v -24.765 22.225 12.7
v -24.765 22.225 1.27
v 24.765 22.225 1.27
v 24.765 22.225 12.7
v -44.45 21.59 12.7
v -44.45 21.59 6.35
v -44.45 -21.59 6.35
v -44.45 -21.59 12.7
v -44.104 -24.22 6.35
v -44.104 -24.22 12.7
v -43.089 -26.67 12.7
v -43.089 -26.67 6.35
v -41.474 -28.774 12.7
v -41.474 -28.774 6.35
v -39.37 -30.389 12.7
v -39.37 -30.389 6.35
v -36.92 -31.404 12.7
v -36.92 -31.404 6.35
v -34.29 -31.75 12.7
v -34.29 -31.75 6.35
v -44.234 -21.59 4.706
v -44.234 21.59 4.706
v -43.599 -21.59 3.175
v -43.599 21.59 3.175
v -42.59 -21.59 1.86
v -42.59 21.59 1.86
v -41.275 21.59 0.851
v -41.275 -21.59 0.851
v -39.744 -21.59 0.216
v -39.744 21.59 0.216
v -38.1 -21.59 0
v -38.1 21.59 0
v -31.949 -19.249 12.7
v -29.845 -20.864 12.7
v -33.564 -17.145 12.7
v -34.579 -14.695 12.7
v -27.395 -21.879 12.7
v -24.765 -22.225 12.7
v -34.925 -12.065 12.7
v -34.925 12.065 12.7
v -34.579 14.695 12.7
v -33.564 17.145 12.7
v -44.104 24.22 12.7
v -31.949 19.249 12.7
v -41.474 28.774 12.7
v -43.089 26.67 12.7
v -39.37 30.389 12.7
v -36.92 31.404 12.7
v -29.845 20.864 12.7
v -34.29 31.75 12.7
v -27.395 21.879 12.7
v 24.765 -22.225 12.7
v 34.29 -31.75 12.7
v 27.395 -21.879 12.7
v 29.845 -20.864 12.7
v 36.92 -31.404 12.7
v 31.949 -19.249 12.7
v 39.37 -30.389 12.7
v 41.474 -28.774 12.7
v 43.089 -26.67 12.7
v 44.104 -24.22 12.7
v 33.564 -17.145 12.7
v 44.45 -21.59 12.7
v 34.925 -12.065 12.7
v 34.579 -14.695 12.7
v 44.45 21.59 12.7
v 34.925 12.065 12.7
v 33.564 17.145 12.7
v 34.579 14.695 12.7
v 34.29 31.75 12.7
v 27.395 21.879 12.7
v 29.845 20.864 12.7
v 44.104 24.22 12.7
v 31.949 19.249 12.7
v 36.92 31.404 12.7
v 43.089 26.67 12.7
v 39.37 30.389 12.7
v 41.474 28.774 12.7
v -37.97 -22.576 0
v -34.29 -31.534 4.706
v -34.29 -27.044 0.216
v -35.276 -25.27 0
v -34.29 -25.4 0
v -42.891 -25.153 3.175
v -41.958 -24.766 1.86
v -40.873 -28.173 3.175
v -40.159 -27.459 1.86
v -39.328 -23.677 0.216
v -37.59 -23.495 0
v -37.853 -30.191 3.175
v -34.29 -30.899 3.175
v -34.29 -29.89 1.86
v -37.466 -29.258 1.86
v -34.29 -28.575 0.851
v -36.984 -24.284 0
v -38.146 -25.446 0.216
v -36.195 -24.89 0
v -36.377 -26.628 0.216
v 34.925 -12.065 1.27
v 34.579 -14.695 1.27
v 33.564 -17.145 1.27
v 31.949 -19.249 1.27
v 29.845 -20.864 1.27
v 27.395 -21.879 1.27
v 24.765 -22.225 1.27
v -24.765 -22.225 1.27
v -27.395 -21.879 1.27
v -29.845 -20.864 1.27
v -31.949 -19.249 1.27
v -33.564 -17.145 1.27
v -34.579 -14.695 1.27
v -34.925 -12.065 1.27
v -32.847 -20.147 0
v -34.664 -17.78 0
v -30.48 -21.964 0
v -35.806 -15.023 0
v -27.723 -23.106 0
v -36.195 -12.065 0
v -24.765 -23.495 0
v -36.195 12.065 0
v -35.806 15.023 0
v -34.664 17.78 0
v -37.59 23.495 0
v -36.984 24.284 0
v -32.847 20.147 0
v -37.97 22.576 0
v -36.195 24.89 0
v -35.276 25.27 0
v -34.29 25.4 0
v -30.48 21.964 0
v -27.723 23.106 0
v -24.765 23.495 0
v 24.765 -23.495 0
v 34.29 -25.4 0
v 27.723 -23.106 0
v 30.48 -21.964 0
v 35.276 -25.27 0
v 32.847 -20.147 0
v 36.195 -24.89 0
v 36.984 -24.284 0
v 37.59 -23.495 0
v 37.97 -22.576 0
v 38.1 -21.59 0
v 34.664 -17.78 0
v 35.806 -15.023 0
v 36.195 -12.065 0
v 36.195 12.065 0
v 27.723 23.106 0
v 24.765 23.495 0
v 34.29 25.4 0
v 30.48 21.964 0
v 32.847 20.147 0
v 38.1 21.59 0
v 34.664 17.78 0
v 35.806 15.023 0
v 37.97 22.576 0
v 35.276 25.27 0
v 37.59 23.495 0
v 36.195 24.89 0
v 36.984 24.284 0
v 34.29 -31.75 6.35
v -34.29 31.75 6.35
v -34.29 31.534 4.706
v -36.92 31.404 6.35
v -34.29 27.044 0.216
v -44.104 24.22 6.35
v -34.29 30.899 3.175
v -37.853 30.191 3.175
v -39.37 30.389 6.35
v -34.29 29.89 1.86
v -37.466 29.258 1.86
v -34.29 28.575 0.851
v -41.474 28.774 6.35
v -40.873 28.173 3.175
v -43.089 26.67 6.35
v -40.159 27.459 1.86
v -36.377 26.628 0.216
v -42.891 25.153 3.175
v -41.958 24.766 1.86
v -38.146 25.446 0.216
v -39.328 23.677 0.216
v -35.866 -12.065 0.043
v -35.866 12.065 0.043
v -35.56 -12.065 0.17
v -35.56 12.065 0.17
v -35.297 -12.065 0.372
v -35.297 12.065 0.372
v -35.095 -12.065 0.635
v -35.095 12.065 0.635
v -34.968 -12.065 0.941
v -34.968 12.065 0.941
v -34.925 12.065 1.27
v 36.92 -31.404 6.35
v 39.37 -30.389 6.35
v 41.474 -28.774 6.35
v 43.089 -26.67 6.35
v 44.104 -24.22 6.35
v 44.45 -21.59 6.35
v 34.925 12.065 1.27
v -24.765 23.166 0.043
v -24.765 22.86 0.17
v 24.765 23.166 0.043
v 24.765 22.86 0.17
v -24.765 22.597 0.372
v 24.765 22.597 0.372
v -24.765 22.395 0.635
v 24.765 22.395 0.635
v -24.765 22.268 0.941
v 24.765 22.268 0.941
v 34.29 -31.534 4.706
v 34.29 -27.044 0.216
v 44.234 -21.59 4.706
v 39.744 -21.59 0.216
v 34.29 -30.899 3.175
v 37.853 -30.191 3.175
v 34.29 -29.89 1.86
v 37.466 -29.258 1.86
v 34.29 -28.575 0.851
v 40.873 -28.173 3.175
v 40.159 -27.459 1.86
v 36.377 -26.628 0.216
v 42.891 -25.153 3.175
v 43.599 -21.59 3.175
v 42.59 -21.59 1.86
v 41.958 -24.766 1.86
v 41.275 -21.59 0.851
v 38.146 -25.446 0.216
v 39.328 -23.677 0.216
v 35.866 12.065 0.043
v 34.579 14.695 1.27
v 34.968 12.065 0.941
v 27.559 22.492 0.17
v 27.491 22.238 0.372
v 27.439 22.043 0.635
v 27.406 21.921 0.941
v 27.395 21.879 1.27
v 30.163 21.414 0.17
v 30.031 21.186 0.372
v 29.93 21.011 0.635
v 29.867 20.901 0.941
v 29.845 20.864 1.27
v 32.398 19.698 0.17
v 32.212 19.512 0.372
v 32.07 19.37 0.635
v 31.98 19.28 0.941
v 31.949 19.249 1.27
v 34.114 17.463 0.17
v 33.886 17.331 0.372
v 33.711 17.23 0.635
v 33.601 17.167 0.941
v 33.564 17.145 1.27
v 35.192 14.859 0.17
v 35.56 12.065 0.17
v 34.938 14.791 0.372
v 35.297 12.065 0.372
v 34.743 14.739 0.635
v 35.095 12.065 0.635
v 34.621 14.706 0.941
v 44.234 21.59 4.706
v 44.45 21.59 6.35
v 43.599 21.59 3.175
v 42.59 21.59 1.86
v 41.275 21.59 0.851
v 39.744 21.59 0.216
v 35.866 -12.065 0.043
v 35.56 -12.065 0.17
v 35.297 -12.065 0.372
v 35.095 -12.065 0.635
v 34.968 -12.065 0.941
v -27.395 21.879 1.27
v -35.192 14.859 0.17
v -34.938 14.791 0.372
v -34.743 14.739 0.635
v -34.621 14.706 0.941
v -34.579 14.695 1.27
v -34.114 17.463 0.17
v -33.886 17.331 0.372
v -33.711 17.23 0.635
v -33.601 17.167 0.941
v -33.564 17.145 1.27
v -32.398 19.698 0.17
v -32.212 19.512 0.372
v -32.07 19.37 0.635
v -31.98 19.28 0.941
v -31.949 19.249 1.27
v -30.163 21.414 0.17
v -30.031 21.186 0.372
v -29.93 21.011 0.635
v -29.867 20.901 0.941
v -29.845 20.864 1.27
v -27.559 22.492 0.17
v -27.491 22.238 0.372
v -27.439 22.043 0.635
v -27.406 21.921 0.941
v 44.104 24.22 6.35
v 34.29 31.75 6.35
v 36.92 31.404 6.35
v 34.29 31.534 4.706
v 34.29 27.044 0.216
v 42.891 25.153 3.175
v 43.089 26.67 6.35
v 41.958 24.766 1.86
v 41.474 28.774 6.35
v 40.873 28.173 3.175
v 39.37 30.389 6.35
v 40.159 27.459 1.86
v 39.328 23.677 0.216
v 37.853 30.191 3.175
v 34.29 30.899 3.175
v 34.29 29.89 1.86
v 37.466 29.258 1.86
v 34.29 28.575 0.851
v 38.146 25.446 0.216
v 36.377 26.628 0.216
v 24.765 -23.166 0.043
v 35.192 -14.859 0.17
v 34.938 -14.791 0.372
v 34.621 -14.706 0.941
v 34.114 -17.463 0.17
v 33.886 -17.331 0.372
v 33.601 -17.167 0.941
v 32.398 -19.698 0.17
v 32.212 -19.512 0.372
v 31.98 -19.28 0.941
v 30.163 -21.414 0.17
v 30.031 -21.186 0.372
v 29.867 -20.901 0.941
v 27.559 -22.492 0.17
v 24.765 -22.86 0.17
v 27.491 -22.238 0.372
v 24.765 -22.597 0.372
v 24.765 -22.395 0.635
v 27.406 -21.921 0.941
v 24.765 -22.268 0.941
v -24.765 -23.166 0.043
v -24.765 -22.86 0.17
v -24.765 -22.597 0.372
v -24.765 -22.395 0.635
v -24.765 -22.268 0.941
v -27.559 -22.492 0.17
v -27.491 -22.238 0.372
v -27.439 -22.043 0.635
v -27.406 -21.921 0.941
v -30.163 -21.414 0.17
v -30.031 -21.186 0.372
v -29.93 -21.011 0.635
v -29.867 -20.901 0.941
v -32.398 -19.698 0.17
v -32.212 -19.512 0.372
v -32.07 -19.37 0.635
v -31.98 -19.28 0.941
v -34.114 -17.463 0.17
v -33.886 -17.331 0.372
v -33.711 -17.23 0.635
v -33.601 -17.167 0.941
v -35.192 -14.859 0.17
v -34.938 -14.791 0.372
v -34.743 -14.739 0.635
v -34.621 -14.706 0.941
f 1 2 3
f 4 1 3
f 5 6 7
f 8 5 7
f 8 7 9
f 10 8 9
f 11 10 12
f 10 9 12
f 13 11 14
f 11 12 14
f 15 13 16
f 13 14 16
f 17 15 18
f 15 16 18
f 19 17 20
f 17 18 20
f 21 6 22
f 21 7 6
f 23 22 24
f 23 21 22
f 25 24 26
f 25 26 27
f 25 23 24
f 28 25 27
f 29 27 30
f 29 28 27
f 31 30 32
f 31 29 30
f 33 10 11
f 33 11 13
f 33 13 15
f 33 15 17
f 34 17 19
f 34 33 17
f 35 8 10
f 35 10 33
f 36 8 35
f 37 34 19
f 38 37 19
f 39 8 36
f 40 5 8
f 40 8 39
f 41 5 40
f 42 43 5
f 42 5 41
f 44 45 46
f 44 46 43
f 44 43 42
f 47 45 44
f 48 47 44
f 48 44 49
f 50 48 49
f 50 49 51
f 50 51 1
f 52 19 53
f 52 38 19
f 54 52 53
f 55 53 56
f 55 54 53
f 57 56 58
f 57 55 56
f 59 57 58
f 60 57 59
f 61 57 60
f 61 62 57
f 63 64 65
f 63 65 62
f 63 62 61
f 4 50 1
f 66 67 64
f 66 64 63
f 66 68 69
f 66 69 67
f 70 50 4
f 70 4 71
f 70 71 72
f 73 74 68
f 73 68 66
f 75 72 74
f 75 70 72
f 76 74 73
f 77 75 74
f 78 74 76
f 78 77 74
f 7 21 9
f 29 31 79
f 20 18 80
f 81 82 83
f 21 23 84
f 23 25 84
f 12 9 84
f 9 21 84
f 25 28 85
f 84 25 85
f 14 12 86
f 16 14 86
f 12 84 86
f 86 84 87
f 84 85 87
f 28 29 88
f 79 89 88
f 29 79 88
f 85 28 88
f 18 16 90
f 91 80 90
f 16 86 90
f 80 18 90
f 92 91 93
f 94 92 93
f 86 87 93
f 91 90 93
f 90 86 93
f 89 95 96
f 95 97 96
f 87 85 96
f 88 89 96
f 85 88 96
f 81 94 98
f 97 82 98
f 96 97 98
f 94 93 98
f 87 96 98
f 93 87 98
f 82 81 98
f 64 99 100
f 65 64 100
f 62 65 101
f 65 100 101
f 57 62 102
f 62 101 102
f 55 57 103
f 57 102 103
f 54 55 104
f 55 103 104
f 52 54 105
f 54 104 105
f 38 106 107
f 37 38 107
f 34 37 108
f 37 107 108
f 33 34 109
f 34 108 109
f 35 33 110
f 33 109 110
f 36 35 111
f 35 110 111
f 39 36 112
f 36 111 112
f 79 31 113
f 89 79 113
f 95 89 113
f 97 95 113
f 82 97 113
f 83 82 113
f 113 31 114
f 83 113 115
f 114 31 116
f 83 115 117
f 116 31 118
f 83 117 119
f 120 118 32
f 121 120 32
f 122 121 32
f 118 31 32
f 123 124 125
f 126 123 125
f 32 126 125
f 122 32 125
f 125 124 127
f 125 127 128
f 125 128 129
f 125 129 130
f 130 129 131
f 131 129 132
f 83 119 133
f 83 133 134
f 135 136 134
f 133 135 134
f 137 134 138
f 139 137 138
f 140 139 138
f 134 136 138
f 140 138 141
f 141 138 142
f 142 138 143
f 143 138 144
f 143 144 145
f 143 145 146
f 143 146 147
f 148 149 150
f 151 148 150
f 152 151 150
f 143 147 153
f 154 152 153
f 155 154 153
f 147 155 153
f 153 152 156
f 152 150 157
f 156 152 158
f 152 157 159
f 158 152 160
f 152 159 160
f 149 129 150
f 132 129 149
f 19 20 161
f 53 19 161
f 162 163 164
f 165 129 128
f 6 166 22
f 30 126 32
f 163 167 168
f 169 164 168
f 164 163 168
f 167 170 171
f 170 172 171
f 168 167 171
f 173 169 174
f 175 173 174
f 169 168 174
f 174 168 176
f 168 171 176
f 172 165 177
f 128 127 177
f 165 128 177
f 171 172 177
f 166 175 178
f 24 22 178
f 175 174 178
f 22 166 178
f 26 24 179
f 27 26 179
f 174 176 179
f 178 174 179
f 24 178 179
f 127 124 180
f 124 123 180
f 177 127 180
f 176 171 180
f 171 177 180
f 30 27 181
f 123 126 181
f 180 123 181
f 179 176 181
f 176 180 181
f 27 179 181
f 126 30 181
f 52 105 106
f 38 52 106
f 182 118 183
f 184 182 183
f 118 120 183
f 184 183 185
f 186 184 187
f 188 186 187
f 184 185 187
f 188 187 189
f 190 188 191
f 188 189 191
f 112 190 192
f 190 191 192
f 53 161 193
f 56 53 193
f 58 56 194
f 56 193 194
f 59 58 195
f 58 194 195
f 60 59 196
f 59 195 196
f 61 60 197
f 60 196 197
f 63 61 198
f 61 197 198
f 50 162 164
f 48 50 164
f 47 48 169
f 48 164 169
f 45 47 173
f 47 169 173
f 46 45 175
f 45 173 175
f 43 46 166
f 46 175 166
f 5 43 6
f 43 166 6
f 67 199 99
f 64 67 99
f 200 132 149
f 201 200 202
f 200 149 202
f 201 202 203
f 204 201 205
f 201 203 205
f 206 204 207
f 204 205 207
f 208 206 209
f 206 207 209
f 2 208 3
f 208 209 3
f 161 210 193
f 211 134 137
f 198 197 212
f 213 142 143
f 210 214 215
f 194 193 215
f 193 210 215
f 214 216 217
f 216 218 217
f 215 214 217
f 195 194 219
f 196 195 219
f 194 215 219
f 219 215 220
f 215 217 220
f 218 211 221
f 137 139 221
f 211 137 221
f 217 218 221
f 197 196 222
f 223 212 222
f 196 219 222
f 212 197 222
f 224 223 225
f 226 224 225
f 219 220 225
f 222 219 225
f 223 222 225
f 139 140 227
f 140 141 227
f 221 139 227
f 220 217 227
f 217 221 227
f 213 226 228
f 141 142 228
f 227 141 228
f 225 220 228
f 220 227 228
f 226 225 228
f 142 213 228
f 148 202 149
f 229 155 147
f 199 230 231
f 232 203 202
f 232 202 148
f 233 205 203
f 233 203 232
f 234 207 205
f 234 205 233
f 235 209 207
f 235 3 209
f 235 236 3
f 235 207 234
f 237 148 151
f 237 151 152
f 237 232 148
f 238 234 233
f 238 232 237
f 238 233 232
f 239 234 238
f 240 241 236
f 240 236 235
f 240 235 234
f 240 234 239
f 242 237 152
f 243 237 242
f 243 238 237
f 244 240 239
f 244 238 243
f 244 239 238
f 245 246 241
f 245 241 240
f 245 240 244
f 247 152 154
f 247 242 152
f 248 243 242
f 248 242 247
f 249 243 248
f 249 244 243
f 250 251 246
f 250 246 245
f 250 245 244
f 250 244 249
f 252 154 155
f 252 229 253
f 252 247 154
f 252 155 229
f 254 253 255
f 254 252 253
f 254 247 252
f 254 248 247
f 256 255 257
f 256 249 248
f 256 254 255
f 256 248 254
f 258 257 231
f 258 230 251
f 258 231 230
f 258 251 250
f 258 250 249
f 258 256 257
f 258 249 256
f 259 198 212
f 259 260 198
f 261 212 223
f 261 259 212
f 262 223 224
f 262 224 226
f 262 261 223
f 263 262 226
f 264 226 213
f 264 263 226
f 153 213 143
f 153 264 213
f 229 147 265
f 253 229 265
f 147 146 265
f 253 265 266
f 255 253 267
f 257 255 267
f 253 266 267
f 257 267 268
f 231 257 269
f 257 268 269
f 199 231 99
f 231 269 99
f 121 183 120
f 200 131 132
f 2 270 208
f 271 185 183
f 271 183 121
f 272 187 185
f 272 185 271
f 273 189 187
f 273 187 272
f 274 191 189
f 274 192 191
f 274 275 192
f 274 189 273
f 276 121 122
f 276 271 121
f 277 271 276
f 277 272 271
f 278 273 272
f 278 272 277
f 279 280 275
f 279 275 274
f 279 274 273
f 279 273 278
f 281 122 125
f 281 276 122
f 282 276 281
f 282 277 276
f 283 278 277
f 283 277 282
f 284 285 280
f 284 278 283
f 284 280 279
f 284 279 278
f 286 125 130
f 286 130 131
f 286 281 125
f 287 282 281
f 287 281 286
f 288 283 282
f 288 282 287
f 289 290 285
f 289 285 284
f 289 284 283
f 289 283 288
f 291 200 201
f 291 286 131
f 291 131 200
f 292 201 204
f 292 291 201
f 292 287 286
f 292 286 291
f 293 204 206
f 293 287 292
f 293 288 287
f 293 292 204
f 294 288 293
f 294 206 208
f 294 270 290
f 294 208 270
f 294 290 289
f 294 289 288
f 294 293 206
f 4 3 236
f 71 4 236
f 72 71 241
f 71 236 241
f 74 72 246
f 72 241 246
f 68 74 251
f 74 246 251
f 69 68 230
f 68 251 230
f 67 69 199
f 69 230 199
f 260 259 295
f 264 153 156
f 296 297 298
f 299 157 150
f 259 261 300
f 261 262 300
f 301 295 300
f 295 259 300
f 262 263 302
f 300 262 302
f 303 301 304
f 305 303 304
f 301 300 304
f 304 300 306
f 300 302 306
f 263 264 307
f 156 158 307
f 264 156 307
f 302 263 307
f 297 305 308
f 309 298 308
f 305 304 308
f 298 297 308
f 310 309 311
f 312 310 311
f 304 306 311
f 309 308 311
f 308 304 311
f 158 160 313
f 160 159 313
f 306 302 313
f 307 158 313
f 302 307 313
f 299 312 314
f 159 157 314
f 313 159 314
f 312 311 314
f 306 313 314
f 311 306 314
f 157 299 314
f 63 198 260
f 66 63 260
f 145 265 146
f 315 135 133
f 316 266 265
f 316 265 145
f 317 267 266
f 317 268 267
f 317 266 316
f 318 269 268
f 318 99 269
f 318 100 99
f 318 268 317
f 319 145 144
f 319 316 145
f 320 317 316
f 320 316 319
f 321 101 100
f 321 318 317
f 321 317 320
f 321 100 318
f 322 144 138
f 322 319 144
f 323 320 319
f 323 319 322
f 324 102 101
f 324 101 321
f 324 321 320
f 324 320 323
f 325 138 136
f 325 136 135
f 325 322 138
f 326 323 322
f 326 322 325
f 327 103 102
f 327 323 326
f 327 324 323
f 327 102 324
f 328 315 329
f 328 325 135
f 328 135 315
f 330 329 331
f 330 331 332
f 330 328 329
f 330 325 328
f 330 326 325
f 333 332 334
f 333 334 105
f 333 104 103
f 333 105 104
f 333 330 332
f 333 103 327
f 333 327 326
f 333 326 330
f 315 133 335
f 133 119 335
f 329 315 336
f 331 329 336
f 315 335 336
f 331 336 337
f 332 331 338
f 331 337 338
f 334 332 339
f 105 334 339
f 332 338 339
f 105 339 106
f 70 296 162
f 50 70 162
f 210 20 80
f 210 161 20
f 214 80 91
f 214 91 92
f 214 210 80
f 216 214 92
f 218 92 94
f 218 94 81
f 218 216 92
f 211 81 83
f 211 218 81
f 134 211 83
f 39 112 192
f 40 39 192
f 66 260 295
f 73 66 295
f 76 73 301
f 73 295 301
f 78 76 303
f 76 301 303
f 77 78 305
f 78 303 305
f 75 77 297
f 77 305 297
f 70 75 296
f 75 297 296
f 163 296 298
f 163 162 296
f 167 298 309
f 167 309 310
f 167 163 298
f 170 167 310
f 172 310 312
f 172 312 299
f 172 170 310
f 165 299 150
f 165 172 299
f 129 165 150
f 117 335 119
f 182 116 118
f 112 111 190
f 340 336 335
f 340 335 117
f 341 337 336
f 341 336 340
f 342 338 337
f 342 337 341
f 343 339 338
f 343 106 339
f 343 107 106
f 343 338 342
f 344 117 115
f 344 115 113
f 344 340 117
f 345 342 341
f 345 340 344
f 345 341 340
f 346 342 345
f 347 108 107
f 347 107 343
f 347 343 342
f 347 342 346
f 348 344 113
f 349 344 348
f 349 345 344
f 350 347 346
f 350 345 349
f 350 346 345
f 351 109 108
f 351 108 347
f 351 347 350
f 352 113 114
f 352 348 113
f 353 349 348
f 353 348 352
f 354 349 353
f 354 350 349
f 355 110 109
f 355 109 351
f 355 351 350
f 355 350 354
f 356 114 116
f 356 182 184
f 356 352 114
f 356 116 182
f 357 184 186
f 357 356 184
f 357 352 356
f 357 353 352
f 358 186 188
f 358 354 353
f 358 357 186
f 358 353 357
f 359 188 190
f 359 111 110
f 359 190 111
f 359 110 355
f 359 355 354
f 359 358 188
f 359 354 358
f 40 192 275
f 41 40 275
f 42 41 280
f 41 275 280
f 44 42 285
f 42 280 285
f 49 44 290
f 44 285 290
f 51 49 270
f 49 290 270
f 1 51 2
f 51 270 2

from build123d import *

# Parameters (mm, degrees)
F1_DEPTH = 12.7
F2_R     = 6.35
F3_R     = 1.27


with BuildPart() as f1:
    # F0 (on Top) → F1 (new body)
    with BuildSketch(Plane.XY):
        with BuildLine():
            Line((34.29, 31.75), (-34.29, 31.75))
            ThreePointArc((-34.29, 31.75), (-41.474205, 28.774205), (-44.45, 21.59))
            Line((-44.45, 21.59), (-44.45, -21.59))
            ThreePointArc((-44.45, -21.59), (-41.474205, -28.774205), (-34.29, -31.75))
            Line((-34.29, -31.75), (34.29, -31.75))
            ThreePointArc((34.29, -31.75), (41.474205, -28.774205), (44.45, -21.59))
            Line((44.45, -21.59), (44.45, 21.59))
            ThreePointArc((44.45, 21.59), (41.474205, 28.774205), (34.29, 31.75))
        make_face()
        with BuildLine():
            ThreePointArc((34.925, -12.065), (31.949205, -19.249205), (24.765, -22.225))
            Line((24.765, -22.225), (-24.765, -22.225))
            ThreePointArc((-24.765, -22.225), (-31.949205, -19.249205), (-34.925, -12.065))
            Line((-34.925, -12.065), (-34.925, 12.065))
            ThreePointArc((-34.925, 12.065), (-31.949205, 19.249205), (-24.765, 22.225))
            Line((-24.765, 22.225), (24.765, 22.225))
            ThreePointArc((24.765, 22.225), (31.949205, 19.249205), (34.925, 12.065))
            Line((34.925, 12.065), (34.925, -12.065))
        make_face(mode=Mode.SUBTRACT)
    extrude(amount=F1_DEPTH)

    # F2
    f2_edges = [f1.edges().sort_by_distance(p)[0] for p in [
        (-41.474205, -28.774205, 0),
    ]]
    fillet(f2_edges, radius=F2_R)

    # F3
    f3_edges = [f1.edges().sort_by_distance(p)[0] for p in [
        (0, -22.225, 0),
        (-31.949205, -19.249205, 0),
        (-34.925, 0, 0),
        (-31.949205, 19.249205, 0),
        (0, 22.225, 0),
        (31.949205, 19.249205, 0),
        (34.925, 0, 0),
        (31.949205, -19.249205, 0),
    ]]
    fillet(f3_edges, radius=F3_R)


solid = f1.part
